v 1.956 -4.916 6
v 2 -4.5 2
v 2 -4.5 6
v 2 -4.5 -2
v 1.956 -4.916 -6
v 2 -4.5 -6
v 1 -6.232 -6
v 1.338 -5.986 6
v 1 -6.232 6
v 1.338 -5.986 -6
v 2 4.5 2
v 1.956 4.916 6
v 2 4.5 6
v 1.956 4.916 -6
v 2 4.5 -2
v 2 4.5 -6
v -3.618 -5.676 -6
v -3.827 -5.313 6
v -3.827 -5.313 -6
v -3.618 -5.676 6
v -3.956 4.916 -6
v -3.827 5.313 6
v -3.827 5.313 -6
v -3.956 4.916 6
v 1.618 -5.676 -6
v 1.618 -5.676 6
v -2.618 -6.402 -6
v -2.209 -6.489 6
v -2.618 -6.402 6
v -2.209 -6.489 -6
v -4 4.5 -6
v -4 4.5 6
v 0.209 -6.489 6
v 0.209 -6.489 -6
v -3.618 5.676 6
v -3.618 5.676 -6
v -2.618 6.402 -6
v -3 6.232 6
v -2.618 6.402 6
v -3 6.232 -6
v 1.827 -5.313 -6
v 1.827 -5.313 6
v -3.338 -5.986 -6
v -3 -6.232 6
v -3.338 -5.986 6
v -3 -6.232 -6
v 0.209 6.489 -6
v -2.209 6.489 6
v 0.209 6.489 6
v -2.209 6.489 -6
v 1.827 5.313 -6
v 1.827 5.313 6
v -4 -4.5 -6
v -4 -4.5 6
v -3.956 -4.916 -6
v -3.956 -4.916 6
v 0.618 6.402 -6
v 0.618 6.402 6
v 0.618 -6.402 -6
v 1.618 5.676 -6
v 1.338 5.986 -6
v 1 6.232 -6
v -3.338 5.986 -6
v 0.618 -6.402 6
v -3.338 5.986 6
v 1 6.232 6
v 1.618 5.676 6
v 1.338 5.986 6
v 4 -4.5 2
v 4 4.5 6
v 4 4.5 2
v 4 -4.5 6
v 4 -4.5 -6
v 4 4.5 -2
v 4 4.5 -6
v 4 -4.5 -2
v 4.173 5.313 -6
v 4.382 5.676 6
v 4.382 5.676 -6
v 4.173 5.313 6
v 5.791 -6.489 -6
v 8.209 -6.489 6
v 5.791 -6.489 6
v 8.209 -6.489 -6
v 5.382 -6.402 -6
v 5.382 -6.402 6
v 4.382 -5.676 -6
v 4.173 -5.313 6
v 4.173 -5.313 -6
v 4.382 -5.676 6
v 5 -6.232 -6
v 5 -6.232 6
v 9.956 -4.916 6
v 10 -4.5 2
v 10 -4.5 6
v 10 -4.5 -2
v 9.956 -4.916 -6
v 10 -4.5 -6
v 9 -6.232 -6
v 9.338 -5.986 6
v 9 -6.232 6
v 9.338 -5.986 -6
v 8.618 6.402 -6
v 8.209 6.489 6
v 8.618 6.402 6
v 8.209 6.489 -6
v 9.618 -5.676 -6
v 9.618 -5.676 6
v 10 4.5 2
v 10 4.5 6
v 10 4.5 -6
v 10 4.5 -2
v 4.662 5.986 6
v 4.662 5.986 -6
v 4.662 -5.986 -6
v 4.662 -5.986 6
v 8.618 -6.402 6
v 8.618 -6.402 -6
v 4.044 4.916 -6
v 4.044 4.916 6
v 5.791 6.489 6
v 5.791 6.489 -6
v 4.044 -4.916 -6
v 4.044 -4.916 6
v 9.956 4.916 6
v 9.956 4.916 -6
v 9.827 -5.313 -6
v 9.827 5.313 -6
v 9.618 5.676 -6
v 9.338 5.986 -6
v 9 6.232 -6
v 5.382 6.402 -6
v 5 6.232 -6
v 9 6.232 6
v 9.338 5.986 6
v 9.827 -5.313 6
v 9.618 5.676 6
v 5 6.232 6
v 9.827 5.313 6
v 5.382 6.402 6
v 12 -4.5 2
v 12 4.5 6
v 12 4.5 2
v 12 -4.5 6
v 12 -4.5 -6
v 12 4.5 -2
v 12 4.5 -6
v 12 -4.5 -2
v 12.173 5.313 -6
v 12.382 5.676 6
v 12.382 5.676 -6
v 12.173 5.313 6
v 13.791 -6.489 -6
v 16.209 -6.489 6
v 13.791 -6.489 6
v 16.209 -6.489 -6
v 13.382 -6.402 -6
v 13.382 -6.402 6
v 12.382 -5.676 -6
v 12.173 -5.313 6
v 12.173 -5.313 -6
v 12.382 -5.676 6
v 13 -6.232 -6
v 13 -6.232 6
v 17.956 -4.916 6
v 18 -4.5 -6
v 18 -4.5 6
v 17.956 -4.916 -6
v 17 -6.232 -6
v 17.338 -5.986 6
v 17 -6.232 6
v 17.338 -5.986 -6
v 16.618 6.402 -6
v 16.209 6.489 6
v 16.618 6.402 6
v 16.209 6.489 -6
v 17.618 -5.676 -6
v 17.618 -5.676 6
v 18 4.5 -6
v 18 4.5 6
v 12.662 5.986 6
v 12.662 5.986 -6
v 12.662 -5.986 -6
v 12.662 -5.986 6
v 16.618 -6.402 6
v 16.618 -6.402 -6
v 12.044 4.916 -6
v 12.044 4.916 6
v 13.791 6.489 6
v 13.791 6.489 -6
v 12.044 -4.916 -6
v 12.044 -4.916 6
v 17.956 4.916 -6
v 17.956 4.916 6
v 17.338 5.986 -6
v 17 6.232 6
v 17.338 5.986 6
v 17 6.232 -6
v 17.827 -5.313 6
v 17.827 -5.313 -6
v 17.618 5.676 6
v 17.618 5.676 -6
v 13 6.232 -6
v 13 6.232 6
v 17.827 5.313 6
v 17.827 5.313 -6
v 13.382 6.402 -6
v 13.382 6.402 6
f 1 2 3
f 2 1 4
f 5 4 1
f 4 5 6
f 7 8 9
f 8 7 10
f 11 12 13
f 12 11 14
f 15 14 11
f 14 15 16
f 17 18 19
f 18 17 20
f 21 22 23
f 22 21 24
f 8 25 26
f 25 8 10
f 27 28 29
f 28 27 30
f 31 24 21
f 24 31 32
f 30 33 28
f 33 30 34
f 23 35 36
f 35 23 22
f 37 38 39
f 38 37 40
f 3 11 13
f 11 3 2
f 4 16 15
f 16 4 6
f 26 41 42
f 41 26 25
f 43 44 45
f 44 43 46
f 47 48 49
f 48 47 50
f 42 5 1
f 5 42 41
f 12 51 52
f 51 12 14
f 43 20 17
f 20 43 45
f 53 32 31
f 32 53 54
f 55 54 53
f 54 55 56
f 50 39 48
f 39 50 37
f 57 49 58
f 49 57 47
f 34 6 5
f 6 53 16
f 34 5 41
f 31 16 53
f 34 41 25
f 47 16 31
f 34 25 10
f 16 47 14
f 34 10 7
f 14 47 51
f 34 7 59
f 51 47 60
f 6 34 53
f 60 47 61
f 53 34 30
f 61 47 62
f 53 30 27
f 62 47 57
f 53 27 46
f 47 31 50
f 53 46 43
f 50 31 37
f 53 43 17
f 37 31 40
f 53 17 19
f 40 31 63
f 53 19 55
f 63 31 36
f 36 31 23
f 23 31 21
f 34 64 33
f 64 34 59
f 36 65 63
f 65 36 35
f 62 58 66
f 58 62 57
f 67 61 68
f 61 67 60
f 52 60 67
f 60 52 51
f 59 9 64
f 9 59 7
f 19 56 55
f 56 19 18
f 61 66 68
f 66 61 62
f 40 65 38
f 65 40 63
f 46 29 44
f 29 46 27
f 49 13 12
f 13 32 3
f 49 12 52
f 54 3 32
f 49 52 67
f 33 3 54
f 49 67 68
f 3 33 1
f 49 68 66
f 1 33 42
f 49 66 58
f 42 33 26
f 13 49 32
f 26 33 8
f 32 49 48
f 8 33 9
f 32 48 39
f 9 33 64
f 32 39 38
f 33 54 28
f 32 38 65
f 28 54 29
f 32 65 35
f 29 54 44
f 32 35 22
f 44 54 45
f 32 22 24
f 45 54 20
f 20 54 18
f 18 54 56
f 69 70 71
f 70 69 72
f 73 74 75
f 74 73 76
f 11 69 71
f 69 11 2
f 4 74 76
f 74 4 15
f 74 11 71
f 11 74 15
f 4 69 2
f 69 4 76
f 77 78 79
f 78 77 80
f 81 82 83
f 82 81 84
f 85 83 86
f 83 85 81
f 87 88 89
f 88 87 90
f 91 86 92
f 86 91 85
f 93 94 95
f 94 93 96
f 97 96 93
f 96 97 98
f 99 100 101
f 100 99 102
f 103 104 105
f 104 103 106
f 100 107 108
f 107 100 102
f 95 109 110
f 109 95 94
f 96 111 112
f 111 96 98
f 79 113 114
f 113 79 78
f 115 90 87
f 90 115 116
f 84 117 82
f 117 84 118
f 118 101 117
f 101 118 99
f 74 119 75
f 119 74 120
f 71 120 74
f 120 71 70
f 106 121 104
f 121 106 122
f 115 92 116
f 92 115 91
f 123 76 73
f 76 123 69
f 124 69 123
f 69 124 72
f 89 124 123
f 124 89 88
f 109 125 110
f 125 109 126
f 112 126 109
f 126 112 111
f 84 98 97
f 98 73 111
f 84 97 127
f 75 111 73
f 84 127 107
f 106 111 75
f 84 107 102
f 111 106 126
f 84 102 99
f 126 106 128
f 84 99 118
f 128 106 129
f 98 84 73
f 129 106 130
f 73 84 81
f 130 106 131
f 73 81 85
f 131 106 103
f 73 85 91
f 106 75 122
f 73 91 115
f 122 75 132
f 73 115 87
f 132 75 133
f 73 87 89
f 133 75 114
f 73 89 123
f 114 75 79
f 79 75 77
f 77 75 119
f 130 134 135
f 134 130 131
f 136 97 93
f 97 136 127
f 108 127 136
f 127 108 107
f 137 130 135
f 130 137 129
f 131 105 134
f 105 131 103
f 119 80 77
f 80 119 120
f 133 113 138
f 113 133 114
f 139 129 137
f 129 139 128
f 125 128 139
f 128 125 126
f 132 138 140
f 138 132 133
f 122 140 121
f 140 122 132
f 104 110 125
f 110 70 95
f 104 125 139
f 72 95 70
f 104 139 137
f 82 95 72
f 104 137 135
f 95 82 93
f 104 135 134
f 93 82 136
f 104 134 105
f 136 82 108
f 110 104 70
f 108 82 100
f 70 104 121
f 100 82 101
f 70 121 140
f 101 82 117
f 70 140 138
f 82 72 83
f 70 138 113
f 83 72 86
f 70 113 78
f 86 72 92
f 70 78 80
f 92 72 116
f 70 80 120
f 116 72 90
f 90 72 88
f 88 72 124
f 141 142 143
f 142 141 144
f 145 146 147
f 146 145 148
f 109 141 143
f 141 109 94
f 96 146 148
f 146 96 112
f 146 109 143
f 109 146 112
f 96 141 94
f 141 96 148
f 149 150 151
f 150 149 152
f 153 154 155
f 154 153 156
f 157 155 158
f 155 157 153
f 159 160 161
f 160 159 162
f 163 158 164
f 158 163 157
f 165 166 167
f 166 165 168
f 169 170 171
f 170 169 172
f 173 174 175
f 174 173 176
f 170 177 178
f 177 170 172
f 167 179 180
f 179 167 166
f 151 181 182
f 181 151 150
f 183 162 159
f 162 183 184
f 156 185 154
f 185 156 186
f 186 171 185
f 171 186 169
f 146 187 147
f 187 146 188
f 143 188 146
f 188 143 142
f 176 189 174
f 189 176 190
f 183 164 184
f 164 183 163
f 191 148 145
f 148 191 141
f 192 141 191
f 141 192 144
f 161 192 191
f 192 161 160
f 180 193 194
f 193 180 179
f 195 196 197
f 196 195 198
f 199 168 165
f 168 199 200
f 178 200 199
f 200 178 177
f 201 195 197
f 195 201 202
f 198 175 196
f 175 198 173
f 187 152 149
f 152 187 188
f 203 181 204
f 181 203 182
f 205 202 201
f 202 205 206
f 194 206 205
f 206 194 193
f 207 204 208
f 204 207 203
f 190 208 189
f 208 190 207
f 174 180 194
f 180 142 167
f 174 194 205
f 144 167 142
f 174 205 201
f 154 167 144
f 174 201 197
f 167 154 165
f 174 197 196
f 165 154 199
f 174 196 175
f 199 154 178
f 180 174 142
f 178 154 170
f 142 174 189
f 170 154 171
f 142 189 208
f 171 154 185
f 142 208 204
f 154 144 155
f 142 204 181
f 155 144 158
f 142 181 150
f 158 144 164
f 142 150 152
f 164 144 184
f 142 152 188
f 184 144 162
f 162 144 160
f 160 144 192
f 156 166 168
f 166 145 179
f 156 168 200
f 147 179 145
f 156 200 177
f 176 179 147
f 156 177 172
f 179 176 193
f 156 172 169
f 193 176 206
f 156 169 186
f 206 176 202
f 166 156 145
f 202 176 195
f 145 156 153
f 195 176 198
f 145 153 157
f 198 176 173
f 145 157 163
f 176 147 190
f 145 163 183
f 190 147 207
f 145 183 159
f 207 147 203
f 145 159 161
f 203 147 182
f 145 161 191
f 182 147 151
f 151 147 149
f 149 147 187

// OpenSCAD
$fn=30;
height=12;
radius=2;
union(){
    hull(){
        translate([0,-4.5,0])cylinder(r=radius,h=height, center=true);
        translate([-2,4.5,0])cylinder(r=radius,h=height, center=true);
        translate([0,4.5,0])cylinder(r=radius,h=height, center=true);
        translate([-2,-4.5,0])cylinder(r=radius,h=height, center=true);
  }
  translate([3,0,0])cube([radius/1,radius+7,radius+2],center=true);
   translate([8,0,0]) hull(){
        translate([0,-4.5,0])cylinder(r=radius,h=height, center=true);
        translate([-2,4.5,0])cylinder(r=radius,h=height, center=true);
        translate([0,4.5,0])cylinder(r=radius,h=height, center=true);
        translate([-2,-4.5,0])cylinder(r=radius,h=height, center=true);
  }
  translate([11,0,0])cube([radius/1,radius+7,radius+2],center=true);
   translate([16,0,0]) hull(){
        translate([0,-4.5,0])cylinder(r=radius,h=height, center=true);
        translate([-2,4.5,0])cylinder(r=radius,h=height, center=true);
        translate([0,4.5,0])cylinder(r=radius,h=height, center=true);
        translate([-2,-4.5,0])cylinder(r=radius,h=height, center=true);
  }
}
